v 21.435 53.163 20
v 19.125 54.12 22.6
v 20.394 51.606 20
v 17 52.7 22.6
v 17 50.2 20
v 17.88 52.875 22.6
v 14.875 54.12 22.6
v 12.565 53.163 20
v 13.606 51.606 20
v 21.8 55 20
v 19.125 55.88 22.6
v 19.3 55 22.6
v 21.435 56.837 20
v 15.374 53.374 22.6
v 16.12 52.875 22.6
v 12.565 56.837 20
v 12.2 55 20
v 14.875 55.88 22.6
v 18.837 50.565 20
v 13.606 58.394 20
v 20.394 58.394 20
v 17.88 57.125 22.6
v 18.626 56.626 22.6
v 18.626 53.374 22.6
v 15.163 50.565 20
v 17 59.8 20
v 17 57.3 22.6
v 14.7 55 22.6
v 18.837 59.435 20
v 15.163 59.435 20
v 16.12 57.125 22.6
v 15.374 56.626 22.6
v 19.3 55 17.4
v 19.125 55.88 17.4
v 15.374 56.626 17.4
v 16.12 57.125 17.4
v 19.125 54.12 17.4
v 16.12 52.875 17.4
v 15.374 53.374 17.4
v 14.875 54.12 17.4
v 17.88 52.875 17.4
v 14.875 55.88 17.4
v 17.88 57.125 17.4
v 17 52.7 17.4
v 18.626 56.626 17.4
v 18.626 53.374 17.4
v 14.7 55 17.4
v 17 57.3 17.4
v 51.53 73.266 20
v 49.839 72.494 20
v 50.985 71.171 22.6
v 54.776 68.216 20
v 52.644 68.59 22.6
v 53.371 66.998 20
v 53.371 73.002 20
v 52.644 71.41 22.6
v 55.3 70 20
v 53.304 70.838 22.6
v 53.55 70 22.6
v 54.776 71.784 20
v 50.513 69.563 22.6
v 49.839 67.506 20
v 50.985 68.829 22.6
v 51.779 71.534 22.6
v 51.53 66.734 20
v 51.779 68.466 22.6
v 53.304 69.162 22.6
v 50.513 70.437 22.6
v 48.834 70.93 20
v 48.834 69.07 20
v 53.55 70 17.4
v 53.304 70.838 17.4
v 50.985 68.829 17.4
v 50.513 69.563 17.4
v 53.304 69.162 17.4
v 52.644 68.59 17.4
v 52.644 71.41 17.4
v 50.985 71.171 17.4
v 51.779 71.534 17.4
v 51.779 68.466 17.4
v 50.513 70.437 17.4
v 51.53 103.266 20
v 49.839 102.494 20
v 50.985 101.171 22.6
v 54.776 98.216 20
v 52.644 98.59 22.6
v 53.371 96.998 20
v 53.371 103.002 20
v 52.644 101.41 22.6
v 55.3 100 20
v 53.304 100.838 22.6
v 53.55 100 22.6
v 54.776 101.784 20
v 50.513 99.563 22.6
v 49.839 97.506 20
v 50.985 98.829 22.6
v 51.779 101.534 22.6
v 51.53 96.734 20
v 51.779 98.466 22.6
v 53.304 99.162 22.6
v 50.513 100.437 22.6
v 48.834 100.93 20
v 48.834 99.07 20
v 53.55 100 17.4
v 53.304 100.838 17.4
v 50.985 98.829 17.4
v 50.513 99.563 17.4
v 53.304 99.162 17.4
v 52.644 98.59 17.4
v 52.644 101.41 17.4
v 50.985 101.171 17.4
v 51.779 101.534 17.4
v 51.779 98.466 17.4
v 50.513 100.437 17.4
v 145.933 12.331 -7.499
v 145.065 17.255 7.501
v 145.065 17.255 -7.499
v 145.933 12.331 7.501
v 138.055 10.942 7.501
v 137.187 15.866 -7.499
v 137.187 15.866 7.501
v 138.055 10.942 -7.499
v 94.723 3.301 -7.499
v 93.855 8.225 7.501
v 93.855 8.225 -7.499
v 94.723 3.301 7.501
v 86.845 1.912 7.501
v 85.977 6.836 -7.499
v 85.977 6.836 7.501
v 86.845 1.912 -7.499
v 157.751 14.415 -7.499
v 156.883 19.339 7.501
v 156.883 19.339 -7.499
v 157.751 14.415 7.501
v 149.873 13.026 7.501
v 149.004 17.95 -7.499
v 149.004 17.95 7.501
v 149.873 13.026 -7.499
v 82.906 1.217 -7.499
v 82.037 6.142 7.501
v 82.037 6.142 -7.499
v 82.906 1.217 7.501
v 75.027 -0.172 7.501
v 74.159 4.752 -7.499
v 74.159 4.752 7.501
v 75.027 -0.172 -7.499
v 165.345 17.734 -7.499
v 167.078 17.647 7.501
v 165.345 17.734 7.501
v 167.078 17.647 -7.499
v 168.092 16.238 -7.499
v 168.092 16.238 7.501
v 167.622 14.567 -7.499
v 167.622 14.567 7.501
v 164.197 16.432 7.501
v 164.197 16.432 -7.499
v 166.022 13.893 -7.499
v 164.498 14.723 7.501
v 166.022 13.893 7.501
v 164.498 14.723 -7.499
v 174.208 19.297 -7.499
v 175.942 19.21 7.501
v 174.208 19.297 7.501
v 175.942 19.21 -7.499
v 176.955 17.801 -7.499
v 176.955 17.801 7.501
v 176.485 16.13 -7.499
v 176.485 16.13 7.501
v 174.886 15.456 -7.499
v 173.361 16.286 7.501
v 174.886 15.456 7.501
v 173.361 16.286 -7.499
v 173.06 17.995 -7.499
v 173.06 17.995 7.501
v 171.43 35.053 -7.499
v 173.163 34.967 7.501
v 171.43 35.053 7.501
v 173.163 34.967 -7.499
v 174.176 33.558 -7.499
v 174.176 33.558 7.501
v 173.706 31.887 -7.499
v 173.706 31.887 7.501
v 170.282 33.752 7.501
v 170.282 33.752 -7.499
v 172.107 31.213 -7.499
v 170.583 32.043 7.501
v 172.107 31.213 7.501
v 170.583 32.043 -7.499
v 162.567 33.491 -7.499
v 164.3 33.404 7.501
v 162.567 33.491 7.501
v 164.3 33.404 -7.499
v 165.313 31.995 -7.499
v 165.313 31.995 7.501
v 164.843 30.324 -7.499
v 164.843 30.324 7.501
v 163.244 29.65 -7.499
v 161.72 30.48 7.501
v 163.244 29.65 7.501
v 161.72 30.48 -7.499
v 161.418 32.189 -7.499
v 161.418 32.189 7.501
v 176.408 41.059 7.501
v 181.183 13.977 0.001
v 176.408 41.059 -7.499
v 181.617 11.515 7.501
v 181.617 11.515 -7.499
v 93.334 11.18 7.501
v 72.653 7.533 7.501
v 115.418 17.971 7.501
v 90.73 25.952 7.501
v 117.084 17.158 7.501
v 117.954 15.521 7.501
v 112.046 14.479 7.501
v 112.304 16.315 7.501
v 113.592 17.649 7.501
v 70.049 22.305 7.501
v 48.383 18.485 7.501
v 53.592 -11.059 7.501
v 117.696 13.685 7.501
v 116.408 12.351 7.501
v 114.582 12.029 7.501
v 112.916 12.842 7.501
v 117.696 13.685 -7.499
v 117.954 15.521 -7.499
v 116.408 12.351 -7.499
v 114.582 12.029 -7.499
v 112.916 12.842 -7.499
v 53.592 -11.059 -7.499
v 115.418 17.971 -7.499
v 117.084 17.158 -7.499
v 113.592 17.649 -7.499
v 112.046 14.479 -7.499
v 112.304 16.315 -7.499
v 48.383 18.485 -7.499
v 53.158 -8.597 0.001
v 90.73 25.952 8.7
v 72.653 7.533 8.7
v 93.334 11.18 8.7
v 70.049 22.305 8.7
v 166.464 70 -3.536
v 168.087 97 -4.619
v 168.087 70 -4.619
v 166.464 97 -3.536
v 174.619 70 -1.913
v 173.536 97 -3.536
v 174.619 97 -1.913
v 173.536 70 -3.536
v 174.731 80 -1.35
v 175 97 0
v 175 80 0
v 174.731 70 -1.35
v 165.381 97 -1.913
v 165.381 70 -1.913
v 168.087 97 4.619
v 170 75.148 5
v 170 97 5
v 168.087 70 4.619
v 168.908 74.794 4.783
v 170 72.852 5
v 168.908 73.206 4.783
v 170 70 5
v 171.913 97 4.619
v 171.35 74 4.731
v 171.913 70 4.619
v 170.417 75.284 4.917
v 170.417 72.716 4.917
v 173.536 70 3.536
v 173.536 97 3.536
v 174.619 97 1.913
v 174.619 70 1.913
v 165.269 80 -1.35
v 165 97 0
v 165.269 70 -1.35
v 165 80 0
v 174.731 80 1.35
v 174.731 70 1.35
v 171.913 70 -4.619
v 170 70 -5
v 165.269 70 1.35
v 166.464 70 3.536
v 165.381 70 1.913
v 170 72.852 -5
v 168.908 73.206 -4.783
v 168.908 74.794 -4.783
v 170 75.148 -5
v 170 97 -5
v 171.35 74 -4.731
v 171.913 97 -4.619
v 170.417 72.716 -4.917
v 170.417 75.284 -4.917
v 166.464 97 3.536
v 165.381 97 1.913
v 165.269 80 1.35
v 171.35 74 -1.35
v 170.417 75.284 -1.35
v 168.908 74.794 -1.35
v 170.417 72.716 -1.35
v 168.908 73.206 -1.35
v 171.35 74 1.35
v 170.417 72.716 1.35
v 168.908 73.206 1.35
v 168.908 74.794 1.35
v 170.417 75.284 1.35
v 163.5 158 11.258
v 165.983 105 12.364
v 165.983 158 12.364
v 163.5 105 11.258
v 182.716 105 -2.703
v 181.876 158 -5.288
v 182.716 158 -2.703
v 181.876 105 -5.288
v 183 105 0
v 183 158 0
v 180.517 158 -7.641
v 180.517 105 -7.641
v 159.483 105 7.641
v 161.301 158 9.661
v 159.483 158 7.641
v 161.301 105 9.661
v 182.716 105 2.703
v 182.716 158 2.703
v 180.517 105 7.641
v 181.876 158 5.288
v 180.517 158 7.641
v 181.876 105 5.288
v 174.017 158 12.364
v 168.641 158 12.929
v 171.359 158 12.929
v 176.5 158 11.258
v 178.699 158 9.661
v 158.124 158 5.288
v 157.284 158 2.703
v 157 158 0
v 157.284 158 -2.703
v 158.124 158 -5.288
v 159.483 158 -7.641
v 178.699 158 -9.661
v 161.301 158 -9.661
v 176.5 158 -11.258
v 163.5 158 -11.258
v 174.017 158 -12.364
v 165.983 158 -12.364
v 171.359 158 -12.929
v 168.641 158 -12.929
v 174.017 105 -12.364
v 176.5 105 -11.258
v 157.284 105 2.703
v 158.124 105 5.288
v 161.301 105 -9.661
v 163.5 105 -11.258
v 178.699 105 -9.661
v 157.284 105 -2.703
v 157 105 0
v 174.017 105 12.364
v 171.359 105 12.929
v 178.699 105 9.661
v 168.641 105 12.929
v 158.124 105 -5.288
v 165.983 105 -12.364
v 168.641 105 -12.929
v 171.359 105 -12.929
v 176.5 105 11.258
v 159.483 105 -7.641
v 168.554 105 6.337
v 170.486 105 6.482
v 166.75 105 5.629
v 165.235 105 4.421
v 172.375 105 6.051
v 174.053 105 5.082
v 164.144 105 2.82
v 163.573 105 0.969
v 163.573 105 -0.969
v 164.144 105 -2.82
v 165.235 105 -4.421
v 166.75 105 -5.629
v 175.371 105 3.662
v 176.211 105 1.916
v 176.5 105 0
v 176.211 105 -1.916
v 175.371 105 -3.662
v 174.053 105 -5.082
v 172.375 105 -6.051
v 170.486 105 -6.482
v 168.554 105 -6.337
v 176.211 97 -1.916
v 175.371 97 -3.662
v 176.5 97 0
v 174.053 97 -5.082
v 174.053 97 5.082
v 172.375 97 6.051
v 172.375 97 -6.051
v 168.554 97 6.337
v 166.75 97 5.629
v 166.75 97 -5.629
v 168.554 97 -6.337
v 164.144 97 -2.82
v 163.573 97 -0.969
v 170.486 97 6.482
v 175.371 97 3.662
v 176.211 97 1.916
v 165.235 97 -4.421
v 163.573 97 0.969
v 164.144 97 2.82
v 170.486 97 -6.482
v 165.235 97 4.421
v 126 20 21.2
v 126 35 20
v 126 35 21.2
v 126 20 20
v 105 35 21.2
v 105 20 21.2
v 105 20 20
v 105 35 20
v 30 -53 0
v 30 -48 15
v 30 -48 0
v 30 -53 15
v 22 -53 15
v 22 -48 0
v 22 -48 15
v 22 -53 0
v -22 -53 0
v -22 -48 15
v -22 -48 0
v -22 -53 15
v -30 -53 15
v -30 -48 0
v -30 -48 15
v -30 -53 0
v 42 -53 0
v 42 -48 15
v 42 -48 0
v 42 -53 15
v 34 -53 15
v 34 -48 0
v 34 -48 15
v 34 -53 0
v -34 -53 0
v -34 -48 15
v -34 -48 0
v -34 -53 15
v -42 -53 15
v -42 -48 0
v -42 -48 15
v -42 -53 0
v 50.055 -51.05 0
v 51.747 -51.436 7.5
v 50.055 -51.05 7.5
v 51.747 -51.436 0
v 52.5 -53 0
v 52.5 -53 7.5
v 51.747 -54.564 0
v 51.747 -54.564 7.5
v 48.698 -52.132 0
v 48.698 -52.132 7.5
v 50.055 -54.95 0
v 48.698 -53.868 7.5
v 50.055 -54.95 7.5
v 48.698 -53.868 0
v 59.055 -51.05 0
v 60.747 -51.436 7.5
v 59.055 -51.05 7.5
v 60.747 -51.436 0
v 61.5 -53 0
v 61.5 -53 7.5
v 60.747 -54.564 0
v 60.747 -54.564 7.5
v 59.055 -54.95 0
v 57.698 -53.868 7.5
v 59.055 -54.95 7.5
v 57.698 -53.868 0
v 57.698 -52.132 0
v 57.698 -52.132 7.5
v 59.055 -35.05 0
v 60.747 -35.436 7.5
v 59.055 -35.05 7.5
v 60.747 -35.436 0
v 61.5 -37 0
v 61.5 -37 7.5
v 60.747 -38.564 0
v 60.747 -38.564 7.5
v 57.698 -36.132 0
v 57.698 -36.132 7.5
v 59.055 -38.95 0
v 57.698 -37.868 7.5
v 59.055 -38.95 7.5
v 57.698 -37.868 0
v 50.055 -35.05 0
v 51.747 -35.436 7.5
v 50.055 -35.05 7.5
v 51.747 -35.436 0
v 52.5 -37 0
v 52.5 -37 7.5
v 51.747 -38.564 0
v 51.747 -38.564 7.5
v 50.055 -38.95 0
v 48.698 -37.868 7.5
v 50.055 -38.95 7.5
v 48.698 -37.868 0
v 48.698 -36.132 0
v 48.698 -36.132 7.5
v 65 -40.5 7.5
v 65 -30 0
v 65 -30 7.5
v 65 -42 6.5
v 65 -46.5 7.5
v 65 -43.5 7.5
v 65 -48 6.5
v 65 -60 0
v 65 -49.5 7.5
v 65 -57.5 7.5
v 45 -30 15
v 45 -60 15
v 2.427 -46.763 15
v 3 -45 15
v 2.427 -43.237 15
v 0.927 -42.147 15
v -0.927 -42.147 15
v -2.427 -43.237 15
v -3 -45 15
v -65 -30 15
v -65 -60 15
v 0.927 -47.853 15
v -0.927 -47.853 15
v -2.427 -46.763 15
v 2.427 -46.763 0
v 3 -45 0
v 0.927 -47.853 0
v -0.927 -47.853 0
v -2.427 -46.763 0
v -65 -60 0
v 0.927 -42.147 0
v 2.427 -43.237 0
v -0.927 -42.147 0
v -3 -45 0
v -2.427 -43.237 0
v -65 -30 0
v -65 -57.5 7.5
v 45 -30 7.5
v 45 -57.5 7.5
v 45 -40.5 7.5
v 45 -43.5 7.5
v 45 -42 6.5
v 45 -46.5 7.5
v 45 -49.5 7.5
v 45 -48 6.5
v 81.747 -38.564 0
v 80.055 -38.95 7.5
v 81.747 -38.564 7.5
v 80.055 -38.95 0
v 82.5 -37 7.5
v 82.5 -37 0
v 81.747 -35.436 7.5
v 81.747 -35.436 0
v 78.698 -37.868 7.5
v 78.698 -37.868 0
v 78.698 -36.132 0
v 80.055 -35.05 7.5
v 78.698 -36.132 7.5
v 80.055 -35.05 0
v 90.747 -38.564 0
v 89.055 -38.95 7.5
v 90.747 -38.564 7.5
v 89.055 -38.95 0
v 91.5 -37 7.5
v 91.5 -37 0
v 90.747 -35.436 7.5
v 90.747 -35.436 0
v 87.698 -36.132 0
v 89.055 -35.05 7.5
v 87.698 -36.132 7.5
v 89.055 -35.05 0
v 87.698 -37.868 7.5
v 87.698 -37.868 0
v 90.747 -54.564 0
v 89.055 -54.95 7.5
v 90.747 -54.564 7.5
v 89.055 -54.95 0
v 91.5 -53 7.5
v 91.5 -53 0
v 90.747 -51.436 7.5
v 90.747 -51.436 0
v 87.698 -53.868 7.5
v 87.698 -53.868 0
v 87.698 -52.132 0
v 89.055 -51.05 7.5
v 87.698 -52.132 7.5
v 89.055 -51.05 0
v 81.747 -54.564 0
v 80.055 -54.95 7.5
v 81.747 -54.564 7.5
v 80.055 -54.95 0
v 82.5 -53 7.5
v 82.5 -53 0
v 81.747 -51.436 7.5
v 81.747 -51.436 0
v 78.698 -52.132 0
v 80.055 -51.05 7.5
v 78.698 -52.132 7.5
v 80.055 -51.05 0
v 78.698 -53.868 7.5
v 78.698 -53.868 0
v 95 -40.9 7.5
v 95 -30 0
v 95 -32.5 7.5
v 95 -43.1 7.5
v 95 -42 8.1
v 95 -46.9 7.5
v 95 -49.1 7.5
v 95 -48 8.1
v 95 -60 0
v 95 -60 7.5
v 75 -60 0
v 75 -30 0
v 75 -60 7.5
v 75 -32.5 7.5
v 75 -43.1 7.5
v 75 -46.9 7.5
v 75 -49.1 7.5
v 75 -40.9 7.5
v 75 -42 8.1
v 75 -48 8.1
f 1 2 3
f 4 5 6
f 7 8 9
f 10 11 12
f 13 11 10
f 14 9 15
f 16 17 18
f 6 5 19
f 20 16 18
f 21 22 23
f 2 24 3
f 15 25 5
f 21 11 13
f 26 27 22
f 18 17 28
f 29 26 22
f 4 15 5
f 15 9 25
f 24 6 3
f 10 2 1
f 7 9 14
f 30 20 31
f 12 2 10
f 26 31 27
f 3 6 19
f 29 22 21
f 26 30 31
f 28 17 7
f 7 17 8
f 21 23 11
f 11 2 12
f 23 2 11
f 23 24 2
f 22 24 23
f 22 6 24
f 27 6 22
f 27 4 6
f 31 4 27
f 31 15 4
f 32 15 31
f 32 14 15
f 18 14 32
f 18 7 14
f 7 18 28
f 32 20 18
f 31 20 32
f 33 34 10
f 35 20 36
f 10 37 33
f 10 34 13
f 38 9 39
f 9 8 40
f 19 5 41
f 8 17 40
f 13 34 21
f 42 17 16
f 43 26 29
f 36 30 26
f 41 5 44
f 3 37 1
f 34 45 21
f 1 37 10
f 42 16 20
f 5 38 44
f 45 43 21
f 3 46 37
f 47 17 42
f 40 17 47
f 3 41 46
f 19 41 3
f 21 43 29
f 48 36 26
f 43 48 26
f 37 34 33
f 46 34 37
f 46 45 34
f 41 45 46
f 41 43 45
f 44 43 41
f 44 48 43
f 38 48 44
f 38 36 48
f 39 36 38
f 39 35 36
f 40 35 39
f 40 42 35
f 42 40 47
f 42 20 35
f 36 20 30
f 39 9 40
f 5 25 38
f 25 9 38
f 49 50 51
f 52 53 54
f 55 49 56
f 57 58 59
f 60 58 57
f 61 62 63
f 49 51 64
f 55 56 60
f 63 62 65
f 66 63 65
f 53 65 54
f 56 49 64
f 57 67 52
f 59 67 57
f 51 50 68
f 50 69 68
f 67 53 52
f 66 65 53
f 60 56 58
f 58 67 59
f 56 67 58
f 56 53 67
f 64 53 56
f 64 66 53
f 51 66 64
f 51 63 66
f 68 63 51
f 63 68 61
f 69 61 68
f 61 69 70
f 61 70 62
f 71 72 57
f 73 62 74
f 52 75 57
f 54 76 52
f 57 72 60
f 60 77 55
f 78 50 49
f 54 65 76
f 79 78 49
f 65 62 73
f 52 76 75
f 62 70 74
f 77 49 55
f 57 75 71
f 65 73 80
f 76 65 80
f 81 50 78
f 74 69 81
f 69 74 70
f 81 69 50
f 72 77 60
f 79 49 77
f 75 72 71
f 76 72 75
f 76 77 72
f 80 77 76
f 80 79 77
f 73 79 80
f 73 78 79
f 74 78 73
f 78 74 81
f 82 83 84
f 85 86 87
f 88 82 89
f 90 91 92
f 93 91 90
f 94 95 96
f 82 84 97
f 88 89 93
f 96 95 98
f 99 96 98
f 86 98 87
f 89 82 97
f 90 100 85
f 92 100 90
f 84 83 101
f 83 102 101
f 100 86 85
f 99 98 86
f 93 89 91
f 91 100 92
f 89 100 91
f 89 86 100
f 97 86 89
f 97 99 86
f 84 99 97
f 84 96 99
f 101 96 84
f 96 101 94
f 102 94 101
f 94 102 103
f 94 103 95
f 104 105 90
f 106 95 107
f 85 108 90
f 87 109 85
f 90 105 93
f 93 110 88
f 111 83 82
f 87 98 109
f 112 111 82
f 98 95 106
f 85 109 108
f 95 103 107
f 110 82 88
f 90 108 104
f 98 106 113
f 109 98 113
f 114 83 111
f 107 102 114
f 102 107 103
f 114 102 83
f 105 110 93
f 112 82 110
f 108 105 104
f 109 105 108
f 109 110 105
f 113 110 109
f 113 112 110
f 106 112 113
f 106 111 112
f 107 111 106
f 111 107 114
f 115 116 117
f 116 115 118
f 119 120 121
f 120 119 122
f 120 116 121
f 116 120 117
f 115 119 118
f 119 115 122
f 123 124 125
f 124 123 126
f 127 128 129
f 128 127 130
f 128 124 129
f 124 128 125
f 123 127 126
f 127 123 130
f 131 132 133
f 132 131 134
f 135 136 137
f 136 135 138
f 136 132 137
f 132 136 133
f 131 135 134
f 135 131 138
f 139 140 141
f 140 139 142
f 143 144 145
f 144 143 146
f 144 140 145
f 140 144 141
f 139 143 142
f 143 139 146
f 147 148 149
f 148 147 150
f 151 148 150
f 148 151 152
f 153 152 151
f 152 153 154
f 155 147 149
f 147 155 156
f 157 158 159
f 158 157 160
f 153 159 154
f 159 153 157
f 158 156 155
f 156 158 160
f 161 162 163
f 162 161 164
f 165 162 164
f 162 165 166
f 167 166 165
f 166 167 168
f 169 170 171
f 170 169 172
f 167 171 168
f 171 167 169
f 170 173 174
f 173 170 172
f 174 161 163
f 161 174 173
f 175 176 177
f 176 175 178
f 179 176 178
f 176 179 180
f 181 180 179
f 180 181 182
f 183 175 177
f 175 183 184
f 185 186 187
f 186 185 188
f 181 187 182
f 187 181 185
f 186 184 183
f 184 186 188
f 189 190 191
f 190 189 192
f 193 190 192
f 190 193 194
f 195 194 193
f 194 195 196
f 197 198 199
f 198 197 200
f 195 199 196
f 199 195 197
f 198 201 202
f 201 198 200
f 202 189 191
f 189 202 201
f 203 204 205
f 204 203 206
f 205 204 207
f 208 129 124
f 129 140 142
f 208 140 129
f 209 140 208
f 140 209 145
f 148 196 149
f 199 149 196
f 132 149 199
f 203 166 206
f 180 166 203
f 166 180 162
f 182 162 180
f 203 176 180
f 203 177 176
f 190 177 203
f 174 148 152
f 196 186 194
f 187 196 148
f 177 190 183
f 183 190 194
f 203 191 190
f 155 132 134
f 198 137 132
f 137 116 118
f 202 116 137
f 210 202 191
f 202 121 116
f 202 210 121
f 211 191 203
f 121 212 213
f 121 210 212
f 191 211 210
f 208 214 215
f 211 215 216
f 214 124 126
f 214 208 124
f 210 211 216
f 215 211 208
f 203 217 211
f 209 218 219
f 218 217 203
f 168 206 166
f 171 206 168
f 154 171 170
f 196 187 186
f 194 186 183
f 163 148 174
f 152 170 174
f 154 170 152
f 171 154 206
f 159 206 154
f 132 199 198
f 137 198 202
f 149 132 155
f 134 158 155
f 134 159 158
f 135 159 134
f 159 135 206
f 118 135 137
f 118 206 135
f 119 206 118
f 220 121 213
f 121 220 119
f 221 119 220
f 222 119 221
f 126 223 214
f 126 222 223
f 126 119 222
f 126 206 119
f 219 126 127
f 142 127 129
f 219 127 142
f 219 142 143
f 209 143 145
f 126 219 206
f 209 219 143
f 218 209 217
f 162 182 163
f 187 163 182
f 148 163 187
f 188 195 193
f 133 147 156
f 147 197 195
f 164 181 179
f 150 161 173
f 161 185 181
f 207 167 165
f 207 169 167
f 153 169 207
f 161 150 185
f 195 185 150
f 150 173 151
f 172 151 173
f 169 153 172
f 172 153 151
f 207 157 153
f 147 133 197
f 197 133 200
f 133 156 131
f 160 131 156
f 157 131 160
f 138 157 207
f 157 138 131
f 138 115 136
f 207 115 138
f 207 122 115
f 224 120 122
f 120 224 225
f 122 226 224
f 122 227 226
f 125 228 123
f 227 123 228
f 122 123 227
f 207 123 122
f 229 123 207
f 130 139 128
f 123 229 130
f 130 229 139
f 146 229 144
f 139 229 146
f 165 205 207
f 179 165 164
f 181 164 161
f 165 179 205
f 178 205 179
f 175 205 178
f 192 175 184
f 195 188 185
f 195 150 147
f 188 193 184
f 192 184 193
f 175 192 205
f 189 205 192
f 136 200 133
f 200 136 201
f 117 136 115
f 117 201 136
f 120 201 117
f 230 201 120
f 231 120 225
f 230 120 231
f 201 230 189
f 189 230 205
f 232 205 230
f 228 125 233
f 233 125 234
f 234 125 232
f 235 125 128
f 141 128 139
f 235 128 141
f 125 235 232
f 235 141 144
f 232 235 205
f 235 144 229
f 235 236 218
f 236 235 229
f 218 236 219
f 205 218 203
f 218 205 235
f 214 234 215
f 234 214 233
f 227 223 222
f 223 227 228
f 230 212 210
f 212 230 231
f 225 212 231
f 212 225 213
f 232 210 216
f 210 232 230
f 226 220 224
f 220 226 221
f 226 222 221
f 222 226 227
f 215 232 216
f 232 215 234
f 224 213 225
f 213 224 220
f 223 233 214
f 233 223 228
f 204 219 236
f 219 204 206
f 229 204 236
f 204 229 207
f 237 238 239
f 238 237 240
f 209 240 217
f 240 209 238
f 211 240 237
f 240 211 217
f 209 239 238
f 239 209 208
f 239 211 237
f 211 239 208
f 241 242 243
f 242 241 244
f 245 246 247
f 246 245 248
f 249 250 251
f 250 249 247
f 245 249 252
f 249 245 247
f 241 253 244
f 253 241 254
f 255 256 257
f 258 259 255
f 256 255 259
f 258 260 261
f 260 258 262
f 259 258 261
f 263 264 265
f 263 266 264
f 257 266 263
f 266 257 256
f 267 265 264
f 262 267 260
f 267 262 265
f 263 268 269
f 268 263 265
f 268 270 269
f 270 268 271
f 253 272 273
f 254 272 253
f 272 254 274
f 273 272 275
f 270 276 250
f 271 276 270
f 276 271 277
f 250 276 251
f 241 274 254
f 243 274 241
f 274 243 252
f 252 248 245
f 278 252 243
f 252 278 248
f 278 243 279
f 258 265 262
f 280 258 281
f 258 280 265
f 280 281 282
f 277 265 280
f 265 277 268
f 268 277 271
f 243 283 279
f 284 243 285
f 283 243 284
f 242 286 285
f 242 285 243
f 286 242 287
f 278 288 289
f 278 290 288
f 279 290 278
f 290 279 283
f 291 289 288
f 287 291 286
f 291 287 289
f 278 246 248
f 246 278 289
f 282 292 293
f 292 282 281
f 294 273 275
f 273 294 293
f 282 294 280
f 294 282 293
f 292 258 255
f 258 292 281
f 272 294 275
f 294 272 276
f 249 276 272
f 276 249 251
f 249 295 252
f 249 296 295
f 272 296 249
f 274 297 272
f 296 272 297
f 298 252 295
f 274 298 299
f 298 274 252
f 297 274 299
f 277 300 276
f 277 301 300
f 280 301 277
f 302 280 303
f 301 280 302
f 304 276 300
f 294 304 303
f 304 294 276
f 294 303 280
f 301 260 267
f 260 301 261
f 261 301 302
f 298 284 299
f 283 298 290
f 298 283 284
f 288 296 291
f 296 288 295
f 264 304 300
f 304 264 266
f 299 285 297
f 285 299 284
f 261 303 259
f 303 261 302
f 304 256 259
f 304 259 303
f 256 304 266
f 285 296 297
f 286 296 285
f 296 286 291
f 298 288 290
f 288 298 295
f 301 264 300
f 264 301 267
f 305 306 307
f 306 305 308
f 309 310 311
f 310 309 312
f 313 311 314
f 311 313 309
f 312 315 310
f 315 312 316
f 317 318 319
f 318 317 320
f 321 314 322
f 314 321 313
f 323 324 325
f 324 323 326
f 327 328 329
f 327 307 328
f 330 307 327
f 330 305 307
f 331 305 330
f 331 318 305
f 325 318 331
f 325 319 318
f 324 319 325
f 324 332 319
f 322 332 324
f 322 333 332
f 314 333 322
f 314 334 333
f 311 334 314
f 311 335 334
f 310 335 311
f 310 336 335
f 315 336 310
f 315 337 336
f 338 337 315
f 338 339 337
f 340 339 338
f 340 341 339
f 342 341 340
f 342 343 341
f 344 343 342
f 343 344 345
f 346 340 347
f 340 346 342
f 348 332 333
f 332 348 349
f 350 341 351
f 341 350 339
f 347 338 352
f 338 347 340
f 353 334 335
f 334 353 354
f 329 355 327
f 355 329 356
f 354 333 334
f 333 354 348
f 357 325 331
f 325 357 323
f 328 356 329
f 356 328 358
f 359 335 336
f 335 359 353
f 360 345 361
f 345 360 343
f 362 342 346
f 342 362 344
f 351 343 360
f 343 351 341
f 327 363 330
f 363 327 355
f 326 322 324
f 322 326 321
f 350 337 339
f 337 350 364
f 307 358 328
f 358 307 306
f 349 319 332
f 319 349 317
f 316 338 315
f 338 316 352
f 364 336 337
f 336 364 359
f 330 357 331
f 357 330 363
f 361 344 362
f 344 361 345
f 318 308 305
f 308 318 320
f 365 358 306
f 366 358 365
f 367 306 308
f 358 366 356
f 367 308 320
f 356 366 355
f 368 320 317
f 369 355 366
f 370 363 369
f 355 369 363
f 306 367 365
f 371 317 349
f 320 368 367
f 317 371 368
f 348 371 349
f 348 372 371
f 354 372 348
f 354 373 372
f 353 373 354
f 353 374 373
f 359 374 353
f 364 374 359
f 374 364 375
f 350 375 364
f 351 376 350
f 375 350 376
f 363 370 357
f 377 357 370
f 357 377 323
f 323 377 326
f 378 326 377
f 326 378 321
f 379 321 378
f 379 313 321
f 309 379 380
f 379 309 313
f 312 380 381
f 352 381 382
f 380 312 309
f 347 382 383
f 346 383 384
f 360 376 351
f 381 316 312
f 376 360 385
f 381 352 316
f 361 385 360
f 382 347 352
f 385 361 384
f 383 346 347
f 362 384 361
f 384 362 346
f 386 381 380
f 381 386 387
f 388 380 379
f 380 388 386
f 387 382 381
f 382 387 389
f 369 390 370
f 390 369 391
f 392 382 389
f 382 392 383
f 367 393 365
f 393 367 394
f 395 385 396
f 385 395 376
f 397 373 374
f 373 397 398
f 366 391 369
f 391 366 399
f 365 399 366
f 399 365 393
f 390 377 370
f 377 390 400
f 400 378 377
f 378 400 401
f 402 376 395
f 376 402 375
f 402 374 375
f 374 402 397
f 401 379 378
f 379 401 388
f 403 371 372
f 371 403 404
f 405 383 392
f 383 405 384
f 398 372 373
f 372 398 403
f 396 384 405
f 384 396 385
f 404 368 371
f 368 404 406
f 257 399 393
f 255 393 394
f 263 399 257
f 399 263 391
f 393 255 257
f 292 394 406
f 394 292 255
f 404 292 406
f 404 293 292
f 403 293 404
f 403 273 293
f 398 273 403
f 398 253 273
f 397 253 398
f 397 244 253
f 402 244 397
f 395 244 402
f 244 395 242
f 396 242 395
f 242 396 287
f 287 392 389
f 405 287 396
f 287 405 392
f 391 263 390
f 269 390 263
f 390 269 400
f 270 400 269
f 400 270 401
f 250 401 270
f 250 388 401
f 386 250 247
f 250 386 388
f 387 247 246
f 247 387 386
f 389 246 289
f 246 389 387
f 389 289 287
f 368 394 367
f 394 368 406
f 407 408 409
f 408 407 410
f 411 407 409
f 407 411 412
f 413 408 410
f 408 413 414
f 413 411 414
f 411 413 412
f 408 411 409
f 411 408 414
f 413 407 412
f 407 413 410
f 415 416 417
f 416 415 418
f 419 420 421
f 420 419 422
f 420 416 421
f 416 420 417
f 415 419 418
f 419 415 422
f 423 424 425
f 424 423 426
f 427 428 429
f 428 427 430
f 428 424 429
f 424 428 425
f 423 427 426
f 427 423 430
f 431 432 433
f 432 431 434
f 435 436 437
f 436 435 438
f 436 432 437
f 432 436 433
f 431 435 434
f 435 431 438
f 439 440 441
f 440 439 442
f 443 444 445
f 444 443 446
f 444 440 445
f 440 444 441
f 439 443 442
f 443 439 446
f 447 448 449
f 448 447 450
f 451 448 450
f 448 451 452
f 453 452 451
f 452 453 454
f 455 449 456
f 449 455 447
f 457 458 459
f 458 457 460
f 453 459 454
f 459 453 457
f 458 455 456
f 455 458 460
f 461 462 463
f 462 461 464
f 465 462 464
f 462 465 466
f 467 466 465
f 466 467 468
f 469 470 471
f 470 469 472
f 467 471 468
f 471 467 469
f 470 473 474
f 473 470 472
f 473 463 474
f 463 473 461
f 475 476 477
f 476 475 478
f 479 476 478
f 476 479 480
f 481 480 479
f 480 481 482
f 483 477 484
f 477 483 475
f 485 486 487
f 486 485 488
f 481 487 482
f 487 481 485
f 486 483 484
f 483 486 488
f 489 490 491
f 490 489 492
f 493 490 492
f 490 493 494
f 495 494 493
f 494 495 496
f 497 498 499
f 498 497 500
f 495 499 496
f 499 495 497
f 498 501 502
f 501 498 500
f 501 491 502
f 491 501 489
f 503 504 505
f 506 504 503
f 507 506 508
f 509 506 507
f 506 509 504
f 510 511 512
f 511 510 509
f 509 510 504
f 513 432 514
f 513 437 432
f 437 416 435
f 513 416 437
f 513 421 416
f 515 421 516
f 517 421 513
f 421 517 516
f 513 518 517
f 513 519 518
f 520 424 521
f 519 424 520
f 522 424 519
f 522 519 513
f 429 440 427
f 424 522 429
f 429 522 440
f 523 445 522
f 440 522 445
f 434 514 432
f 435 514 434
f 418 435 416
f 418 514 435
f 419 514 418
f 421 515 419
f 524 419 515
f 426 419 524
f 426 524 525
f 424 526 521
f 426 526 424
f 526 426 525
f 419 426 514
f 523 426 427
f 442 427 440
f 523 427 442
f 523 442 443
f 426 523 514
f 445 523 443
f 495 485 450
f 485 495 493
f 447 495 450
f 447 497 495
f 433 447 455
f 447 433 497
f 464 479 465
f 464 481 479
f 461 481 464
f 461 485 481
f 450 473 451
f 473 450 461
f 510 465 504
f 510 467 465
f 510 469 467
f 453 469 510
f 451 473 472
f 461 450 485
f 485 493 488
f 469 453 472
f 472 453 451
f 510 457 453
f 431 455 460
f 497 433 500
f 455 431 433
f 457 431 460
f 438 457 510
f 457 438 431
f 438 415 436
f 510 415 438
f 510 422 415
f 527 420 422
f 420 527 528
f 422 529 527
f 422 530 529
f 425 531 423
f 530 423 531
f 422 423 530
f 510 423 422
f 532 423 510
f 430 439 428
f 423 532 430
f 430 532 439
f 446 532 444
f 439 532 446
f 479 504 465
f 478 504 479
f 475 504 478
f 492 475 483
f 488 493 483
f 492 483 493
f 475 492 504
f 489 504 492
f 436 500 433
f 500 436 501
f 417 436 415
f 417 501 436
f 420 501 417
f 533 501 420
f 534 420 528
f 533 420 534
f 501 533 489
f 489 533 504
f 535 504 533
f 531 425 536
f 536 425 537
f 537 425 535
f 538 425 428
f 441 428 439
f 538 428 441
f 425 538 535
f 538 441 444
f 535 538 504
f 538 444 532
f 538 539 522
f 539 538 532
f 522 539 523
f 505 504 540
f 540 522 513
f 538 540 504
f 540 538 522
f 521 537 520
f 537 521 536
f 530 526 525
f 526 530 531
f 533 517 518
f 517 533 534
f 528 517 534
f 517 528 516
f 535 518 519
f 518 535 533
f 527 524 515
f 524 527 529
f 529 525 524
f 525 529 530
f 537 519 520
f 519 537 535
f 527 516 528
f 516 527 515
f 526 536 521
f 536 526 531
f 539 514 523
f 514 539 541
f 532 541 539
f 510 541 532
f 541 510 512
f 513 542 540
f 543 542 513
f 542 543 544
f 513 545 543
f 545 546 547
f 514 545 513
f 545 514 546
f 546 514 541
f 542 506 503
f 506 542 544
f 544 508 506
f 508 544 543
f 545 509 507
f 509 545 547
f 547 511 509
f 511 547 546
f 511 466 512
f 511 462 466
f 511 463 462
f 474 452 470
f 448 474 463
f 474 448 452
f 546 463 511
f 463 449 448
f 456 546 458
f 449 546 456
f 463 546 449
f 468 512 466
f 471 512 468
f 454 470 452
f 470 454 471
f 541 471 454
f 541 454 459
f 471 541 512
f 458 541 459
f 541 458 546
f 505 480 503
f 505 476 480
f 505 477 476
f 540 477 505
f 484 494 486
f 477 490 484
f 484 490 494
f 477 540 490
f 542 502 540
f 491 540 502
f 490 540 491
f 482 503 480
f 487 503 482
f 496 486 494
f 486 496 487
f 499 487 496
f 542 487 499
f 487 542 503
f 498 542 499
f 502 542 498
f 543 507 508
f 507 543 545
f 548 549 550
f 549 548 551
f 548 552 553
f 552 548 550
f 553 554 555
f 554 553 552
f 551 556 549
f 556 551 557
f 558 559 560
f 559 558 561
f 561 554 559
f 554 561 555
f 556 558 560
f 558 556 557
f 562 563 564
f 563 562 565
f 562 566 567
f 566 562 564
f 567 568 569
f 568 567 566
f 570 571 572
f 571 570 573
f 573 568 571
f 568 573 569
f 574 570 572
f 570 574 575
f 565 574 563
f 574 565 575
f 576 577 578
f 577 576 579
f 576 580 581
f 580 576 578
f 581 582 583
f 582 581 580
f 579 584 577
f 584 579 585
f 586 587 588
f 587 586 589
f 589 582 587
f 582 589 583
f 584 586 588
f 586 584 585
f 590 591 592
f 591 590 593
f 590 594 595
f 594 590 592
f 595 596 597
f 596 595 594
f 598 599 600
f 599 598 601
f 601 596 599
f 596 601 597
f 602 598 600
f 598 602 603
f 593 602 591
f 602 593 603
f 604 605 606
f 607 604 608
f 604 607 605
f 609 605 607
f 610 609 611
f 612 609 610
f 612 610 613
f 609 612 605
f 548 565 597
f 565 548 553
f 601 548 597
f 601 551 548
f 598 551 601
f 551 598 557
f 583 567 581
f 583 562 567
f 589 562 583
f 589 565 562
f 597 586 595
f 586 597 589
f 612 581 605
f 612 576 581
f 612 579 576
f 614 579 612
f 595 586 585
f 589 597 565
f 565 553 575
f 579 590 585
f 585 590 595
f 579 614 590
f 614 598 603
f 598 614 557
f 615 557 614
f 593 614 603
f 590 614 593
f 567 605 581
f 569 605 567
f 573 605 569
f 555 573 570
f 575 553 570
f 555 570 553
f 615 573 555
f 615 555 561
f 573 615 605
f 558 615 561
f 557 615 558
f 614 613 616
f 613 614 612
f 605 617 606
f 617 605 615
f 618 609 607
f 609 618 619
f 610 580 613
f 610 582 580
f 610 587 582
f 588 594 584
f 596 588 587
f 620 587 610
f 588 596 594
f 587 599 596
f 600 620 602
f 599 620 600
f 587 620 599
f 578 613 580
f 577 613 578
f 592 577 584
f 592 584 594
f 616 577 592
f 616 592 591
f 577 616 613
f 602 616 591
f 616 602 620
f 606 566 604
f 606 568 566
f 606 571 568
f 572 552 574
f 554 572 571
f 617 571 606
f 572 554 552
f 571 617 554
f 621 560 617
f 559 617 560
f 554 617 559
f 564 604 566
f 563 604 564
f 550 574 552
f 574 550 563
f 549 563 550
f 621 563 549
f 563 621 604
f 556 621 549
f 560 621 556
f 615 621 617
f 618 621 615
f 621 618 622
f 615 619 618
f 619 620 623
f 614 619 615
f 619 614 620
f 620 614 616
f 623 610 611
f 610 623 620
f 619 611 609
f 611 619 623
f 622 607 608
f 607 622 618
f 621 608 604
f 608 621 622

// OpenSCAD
// file: dumbstick.scad
// length unit: millimeters


PULL = 0; //[0:0.1:13]
PRINT_EPSILON = 0.4;
CAD_EPSILON = 0.05;
AXIS_DIAMETER = 6;

module __customizer_delimiter__(){} // every variable below here is not shown in customizer

solenoid_body_diameter = 26;
solenoid_thread_diameter = 13;

module metal_part() {
    C = 0.8;
    color([C,C,C]) children();
}

module electronics_part() {
    color([0,0.3,0.8]) children();
}

module solenoid() {
    module plunger() {
        diameter = 10;
        extend = 35 - PULL;
        cut_depth = 10;
        cut_width = 2.7;
        cut_hole_diameter = 2.7;
        cut_aux = diameter*2;
        cut_epsilon = 0.1;
        cut_zcenter = 4;
        difference() {
            translate([0,0,-extend])
                cylinder(h=extend,d=diameter);
            translate([-cut_aux/2, -cut_width/2,-extend-cut_epsilon])
                cube([cut_aux, cut_width, cut_depth+cut_epsilon]);
            translate([0,0,-extend+cut_zcenter]) rotate([90,0,0])
                cylinder(h=diameter*20, d=cut_hole_diameter, center = true);
        }
    }

    metal_part() {
        body_diameter = solenoid_body_diameter;
        body_height = 53;
        thread_diameter = solenoid_thread_diameter;
        thread_extend = 8;

        cylinder(h=body_height,d=body_diameter);
        translate([0,0,-thread_extend])
            cylinder(h=thread_extend,d=thread_diameter);
        plunger();
    }
}

module imu() {
    electronics_part() {
        cube([21, 15, 1.2]); // GY-521
    }
}


module B0() {

    // primary stop screw
    stop0_diameter = 6.5;
    stop0_angle = 25;
    stop0_offset = 72;

    wire_diameter = 4;

    difference() {
        translate([0,0,-20]) linear_extrude(height=40, convexity=3) import("b0.dxf");
        translate([-50,-10,-10]) cube([100,40+10,20]);
        translate([15,15,-50]) cylinder(h=100,d=AXIS_DIAMETER);
        translate([stop0_offset,0,0]) rotate([0,0,stop0_angle]) rotate([-90,0,0]) cylinder(h=100,d=stop0_diameter);
        translate([70,0,0]) rotate([-90,0,0]) cylinder(h=100,d=wire_diameter);
        translate([70,105,0]) rotate([-90,0,0]) cylinder(h=100,d=solenoid_body_diameter+PRINT_EPSILON);
    }
}

module B0_solenoid() {
    translate([70,105,0])
    rotate([-90,0,0])
    solenoid();
}

module B0_imu() {
    translate([5,20,20])
    imu();
}

module fastener(s, sub_epsilon = false) {
    // XXX does PRINT_EPSILON hold at an angle?
    dh = sub_epsilon ? -PRINT_EPSILON : 0;
    ds = sub_epsilon ? -PRINT_EPSILON : 0;
    cylinder(h=3+dh,d1=s+ds,d2=s/2+ds);
    mirror([0,0,1]) cylinder(h=3+dh,d1=s+ds,d2=s/2+ds);
}

module B0_fasteners(sub_epsilon = false) {
    translate([17,55,0]) fastener(10, sub_epsilon);
    translate([52,70,0]) fastener(7, sub_epsilon);
    translate([52,100,0]) fastener(7, sub_epsilon);
}

module B0_bottom() {
    union() {
        difference() {
            B0();
            translate([-10,0,0]) cube([200,200,100]);
        }
        B0_fasteners(true);
    }
}

module B0_top() {
    difference() {
        difference() {
                B0();
                translate([-10,0,-100]) cube([200,200,100]);
            }
        B0_fasteners();
    }
}

module concave_cut(w,d,h) {
    m = 1.2;
    ex = w/2 * m;
    ey = d - (d/(w/2)) * (w/2)*m;
    linear_extrude(height=h)
    polygon([
        [-ex,ey],
        [ 0,d],
        [ ex,ey],
        [ ex,-10+ey],
        [-ex,-10+ey]
    ]);
}

tipper_depth = 15;
tipper_pull_radius = 55;
tipper_margin = 10;
tipper_height = 30;

module TIPPER(angle = 0) {
    d = tipper_depth;
    margin = tipper_margin;
    w = tipper_pull_radius*2 + margin*2;
    ln = tipper_height;
    hh = ln/2;
    stripw = 8;
    striph = 5;
    module strip_hole() {
        translate([0,0,-50]) cube([stripw,striph,100]);
    }
    translate([0,hh,0]) rotate([0,0,angle]) translate([0,-hh,0]) {
        translate([-w/2,0,0]) {
            difference() {
                cube([w,ln,d]);
                translate([w/2,ln/2,-d/2]) cylinder(h=30,d=AXIS_DIAMETER);
                translate([0,0,d/2]) rotate([0,90,0]) translate([0,0,-margin/2]) concave_cut(d,2.5,w+margin);
                translate([w/2-stripw/2,7,0]) {
                    sd0 = 26;
                    translate([sd0,0,0]) strip_hole();
                    translate([-sd0,0,0]) strip_hole();
                    sd1 = 38;
                    translate([sd1,0,0]) strip_hole();
                    translate([-sd1,0,0]) strip_hole();
                }
                translate([w-margin,ln/2,-30]) {
                    dx = 4.5;
                    dy = 8;
                    screw_diameter = 4;
                    translate([-dx,-dy,0])    cylinder(h=60,d=screw_diameter);
                    translate([ dx,-dy,0])    cylinder(h=60,d=screw_diameter);
                    translate([ dx, dy,0])    cylinder(h=60,d=screw_diameter);
                    translate([-dx, dy,0])    cylinder(h=60,d=screw_diameter);
                }
            }
        }
    }
}

module TIPPER_imu(angle = 0) {
    hh = tipper_height/2;
    translate([0,0,15]) {
        translate([0,hh,0]) rotate([0,0,angle]) translate([0,-hh,0]) {
            translate([-43,15,0]) {
                imu();
            }
        }
    }
}


module tipper_cut() {
    translate([tipper_pull_radius-tipper_margin,0,tipper_depth/2]) cube([100,100,30]);
}

module groove_diamond(w,d,h,xt,eps) {
    linear_extrude(height=h+xt)
    polygon([
        [-w/2+eps,0],
        [0,d-eps],
        [w/2-eps,0],
        [0,-d+eps]
    ]);
}

module tipper_groove(xt=0,eps=0) {
    translate([tipper_pull_radius-tipper_margin,tipper_height/2,tipper_depth/2])
    rotate([90,0,0])
    rotate([0,90,0])
    groove_diamond(3,1,tipper_margin*2,xt,eps);
}

module tipper_grooves(xt=0,eps=0) {
    d = 3;
    translate([0,d,0]) tipper_groove(xt,eps);
    translate([0,-d,0]) tipper_groove(xt,eps);
}

module TIPPER_main() {
    difference() {
        TIPPER();
        tipper_cut();
        tipper_grooves(CAD_EPSILON);
    }
}

module TIPPER_clamp() {
    translate([0,tipper_height,tipper_depth/2])
    rotate([180,0,0])
    translate([0,0,-tipper_depth/2])
    union() {
        intersection() {
            TIPPER();
            tipper_cut();
        }
        tipper_grooves(0,PRINT_EPSILON);
    }
}
// main file
include <dumbstick.scad>

SHOW_SOLENOID = true;
SHOW_IMUS = true;
TIPPER_ANGLE = 10;//[-45:1:45]

translate([0,0,20]) B0_bottom();
translate([-10,0,20]) rotate([0,180,0]) B0_top();
translate([100,0,0]) {
    B0();
    translate([15,0,-15/2]) {
        translate([0,0,0.001])/*VISHACK?!*/ TIPPER(angle = TIPPER_ANGLE);
        if (SHOW_IMUS) {
            TIPPER_imu(angle = TIPPER_ANGLE);
        }
    }
    if (SHOW_SOLENOID) {
        B0_solenoid();
    }
    if (SHOW_IMUS) {
        B0_imu();
    }
}

translate([0,-60,0]) {
    translate([0,0,0]) TIPPER_main();
    translate([30,0,0]) TIPPER_clamp();
}
